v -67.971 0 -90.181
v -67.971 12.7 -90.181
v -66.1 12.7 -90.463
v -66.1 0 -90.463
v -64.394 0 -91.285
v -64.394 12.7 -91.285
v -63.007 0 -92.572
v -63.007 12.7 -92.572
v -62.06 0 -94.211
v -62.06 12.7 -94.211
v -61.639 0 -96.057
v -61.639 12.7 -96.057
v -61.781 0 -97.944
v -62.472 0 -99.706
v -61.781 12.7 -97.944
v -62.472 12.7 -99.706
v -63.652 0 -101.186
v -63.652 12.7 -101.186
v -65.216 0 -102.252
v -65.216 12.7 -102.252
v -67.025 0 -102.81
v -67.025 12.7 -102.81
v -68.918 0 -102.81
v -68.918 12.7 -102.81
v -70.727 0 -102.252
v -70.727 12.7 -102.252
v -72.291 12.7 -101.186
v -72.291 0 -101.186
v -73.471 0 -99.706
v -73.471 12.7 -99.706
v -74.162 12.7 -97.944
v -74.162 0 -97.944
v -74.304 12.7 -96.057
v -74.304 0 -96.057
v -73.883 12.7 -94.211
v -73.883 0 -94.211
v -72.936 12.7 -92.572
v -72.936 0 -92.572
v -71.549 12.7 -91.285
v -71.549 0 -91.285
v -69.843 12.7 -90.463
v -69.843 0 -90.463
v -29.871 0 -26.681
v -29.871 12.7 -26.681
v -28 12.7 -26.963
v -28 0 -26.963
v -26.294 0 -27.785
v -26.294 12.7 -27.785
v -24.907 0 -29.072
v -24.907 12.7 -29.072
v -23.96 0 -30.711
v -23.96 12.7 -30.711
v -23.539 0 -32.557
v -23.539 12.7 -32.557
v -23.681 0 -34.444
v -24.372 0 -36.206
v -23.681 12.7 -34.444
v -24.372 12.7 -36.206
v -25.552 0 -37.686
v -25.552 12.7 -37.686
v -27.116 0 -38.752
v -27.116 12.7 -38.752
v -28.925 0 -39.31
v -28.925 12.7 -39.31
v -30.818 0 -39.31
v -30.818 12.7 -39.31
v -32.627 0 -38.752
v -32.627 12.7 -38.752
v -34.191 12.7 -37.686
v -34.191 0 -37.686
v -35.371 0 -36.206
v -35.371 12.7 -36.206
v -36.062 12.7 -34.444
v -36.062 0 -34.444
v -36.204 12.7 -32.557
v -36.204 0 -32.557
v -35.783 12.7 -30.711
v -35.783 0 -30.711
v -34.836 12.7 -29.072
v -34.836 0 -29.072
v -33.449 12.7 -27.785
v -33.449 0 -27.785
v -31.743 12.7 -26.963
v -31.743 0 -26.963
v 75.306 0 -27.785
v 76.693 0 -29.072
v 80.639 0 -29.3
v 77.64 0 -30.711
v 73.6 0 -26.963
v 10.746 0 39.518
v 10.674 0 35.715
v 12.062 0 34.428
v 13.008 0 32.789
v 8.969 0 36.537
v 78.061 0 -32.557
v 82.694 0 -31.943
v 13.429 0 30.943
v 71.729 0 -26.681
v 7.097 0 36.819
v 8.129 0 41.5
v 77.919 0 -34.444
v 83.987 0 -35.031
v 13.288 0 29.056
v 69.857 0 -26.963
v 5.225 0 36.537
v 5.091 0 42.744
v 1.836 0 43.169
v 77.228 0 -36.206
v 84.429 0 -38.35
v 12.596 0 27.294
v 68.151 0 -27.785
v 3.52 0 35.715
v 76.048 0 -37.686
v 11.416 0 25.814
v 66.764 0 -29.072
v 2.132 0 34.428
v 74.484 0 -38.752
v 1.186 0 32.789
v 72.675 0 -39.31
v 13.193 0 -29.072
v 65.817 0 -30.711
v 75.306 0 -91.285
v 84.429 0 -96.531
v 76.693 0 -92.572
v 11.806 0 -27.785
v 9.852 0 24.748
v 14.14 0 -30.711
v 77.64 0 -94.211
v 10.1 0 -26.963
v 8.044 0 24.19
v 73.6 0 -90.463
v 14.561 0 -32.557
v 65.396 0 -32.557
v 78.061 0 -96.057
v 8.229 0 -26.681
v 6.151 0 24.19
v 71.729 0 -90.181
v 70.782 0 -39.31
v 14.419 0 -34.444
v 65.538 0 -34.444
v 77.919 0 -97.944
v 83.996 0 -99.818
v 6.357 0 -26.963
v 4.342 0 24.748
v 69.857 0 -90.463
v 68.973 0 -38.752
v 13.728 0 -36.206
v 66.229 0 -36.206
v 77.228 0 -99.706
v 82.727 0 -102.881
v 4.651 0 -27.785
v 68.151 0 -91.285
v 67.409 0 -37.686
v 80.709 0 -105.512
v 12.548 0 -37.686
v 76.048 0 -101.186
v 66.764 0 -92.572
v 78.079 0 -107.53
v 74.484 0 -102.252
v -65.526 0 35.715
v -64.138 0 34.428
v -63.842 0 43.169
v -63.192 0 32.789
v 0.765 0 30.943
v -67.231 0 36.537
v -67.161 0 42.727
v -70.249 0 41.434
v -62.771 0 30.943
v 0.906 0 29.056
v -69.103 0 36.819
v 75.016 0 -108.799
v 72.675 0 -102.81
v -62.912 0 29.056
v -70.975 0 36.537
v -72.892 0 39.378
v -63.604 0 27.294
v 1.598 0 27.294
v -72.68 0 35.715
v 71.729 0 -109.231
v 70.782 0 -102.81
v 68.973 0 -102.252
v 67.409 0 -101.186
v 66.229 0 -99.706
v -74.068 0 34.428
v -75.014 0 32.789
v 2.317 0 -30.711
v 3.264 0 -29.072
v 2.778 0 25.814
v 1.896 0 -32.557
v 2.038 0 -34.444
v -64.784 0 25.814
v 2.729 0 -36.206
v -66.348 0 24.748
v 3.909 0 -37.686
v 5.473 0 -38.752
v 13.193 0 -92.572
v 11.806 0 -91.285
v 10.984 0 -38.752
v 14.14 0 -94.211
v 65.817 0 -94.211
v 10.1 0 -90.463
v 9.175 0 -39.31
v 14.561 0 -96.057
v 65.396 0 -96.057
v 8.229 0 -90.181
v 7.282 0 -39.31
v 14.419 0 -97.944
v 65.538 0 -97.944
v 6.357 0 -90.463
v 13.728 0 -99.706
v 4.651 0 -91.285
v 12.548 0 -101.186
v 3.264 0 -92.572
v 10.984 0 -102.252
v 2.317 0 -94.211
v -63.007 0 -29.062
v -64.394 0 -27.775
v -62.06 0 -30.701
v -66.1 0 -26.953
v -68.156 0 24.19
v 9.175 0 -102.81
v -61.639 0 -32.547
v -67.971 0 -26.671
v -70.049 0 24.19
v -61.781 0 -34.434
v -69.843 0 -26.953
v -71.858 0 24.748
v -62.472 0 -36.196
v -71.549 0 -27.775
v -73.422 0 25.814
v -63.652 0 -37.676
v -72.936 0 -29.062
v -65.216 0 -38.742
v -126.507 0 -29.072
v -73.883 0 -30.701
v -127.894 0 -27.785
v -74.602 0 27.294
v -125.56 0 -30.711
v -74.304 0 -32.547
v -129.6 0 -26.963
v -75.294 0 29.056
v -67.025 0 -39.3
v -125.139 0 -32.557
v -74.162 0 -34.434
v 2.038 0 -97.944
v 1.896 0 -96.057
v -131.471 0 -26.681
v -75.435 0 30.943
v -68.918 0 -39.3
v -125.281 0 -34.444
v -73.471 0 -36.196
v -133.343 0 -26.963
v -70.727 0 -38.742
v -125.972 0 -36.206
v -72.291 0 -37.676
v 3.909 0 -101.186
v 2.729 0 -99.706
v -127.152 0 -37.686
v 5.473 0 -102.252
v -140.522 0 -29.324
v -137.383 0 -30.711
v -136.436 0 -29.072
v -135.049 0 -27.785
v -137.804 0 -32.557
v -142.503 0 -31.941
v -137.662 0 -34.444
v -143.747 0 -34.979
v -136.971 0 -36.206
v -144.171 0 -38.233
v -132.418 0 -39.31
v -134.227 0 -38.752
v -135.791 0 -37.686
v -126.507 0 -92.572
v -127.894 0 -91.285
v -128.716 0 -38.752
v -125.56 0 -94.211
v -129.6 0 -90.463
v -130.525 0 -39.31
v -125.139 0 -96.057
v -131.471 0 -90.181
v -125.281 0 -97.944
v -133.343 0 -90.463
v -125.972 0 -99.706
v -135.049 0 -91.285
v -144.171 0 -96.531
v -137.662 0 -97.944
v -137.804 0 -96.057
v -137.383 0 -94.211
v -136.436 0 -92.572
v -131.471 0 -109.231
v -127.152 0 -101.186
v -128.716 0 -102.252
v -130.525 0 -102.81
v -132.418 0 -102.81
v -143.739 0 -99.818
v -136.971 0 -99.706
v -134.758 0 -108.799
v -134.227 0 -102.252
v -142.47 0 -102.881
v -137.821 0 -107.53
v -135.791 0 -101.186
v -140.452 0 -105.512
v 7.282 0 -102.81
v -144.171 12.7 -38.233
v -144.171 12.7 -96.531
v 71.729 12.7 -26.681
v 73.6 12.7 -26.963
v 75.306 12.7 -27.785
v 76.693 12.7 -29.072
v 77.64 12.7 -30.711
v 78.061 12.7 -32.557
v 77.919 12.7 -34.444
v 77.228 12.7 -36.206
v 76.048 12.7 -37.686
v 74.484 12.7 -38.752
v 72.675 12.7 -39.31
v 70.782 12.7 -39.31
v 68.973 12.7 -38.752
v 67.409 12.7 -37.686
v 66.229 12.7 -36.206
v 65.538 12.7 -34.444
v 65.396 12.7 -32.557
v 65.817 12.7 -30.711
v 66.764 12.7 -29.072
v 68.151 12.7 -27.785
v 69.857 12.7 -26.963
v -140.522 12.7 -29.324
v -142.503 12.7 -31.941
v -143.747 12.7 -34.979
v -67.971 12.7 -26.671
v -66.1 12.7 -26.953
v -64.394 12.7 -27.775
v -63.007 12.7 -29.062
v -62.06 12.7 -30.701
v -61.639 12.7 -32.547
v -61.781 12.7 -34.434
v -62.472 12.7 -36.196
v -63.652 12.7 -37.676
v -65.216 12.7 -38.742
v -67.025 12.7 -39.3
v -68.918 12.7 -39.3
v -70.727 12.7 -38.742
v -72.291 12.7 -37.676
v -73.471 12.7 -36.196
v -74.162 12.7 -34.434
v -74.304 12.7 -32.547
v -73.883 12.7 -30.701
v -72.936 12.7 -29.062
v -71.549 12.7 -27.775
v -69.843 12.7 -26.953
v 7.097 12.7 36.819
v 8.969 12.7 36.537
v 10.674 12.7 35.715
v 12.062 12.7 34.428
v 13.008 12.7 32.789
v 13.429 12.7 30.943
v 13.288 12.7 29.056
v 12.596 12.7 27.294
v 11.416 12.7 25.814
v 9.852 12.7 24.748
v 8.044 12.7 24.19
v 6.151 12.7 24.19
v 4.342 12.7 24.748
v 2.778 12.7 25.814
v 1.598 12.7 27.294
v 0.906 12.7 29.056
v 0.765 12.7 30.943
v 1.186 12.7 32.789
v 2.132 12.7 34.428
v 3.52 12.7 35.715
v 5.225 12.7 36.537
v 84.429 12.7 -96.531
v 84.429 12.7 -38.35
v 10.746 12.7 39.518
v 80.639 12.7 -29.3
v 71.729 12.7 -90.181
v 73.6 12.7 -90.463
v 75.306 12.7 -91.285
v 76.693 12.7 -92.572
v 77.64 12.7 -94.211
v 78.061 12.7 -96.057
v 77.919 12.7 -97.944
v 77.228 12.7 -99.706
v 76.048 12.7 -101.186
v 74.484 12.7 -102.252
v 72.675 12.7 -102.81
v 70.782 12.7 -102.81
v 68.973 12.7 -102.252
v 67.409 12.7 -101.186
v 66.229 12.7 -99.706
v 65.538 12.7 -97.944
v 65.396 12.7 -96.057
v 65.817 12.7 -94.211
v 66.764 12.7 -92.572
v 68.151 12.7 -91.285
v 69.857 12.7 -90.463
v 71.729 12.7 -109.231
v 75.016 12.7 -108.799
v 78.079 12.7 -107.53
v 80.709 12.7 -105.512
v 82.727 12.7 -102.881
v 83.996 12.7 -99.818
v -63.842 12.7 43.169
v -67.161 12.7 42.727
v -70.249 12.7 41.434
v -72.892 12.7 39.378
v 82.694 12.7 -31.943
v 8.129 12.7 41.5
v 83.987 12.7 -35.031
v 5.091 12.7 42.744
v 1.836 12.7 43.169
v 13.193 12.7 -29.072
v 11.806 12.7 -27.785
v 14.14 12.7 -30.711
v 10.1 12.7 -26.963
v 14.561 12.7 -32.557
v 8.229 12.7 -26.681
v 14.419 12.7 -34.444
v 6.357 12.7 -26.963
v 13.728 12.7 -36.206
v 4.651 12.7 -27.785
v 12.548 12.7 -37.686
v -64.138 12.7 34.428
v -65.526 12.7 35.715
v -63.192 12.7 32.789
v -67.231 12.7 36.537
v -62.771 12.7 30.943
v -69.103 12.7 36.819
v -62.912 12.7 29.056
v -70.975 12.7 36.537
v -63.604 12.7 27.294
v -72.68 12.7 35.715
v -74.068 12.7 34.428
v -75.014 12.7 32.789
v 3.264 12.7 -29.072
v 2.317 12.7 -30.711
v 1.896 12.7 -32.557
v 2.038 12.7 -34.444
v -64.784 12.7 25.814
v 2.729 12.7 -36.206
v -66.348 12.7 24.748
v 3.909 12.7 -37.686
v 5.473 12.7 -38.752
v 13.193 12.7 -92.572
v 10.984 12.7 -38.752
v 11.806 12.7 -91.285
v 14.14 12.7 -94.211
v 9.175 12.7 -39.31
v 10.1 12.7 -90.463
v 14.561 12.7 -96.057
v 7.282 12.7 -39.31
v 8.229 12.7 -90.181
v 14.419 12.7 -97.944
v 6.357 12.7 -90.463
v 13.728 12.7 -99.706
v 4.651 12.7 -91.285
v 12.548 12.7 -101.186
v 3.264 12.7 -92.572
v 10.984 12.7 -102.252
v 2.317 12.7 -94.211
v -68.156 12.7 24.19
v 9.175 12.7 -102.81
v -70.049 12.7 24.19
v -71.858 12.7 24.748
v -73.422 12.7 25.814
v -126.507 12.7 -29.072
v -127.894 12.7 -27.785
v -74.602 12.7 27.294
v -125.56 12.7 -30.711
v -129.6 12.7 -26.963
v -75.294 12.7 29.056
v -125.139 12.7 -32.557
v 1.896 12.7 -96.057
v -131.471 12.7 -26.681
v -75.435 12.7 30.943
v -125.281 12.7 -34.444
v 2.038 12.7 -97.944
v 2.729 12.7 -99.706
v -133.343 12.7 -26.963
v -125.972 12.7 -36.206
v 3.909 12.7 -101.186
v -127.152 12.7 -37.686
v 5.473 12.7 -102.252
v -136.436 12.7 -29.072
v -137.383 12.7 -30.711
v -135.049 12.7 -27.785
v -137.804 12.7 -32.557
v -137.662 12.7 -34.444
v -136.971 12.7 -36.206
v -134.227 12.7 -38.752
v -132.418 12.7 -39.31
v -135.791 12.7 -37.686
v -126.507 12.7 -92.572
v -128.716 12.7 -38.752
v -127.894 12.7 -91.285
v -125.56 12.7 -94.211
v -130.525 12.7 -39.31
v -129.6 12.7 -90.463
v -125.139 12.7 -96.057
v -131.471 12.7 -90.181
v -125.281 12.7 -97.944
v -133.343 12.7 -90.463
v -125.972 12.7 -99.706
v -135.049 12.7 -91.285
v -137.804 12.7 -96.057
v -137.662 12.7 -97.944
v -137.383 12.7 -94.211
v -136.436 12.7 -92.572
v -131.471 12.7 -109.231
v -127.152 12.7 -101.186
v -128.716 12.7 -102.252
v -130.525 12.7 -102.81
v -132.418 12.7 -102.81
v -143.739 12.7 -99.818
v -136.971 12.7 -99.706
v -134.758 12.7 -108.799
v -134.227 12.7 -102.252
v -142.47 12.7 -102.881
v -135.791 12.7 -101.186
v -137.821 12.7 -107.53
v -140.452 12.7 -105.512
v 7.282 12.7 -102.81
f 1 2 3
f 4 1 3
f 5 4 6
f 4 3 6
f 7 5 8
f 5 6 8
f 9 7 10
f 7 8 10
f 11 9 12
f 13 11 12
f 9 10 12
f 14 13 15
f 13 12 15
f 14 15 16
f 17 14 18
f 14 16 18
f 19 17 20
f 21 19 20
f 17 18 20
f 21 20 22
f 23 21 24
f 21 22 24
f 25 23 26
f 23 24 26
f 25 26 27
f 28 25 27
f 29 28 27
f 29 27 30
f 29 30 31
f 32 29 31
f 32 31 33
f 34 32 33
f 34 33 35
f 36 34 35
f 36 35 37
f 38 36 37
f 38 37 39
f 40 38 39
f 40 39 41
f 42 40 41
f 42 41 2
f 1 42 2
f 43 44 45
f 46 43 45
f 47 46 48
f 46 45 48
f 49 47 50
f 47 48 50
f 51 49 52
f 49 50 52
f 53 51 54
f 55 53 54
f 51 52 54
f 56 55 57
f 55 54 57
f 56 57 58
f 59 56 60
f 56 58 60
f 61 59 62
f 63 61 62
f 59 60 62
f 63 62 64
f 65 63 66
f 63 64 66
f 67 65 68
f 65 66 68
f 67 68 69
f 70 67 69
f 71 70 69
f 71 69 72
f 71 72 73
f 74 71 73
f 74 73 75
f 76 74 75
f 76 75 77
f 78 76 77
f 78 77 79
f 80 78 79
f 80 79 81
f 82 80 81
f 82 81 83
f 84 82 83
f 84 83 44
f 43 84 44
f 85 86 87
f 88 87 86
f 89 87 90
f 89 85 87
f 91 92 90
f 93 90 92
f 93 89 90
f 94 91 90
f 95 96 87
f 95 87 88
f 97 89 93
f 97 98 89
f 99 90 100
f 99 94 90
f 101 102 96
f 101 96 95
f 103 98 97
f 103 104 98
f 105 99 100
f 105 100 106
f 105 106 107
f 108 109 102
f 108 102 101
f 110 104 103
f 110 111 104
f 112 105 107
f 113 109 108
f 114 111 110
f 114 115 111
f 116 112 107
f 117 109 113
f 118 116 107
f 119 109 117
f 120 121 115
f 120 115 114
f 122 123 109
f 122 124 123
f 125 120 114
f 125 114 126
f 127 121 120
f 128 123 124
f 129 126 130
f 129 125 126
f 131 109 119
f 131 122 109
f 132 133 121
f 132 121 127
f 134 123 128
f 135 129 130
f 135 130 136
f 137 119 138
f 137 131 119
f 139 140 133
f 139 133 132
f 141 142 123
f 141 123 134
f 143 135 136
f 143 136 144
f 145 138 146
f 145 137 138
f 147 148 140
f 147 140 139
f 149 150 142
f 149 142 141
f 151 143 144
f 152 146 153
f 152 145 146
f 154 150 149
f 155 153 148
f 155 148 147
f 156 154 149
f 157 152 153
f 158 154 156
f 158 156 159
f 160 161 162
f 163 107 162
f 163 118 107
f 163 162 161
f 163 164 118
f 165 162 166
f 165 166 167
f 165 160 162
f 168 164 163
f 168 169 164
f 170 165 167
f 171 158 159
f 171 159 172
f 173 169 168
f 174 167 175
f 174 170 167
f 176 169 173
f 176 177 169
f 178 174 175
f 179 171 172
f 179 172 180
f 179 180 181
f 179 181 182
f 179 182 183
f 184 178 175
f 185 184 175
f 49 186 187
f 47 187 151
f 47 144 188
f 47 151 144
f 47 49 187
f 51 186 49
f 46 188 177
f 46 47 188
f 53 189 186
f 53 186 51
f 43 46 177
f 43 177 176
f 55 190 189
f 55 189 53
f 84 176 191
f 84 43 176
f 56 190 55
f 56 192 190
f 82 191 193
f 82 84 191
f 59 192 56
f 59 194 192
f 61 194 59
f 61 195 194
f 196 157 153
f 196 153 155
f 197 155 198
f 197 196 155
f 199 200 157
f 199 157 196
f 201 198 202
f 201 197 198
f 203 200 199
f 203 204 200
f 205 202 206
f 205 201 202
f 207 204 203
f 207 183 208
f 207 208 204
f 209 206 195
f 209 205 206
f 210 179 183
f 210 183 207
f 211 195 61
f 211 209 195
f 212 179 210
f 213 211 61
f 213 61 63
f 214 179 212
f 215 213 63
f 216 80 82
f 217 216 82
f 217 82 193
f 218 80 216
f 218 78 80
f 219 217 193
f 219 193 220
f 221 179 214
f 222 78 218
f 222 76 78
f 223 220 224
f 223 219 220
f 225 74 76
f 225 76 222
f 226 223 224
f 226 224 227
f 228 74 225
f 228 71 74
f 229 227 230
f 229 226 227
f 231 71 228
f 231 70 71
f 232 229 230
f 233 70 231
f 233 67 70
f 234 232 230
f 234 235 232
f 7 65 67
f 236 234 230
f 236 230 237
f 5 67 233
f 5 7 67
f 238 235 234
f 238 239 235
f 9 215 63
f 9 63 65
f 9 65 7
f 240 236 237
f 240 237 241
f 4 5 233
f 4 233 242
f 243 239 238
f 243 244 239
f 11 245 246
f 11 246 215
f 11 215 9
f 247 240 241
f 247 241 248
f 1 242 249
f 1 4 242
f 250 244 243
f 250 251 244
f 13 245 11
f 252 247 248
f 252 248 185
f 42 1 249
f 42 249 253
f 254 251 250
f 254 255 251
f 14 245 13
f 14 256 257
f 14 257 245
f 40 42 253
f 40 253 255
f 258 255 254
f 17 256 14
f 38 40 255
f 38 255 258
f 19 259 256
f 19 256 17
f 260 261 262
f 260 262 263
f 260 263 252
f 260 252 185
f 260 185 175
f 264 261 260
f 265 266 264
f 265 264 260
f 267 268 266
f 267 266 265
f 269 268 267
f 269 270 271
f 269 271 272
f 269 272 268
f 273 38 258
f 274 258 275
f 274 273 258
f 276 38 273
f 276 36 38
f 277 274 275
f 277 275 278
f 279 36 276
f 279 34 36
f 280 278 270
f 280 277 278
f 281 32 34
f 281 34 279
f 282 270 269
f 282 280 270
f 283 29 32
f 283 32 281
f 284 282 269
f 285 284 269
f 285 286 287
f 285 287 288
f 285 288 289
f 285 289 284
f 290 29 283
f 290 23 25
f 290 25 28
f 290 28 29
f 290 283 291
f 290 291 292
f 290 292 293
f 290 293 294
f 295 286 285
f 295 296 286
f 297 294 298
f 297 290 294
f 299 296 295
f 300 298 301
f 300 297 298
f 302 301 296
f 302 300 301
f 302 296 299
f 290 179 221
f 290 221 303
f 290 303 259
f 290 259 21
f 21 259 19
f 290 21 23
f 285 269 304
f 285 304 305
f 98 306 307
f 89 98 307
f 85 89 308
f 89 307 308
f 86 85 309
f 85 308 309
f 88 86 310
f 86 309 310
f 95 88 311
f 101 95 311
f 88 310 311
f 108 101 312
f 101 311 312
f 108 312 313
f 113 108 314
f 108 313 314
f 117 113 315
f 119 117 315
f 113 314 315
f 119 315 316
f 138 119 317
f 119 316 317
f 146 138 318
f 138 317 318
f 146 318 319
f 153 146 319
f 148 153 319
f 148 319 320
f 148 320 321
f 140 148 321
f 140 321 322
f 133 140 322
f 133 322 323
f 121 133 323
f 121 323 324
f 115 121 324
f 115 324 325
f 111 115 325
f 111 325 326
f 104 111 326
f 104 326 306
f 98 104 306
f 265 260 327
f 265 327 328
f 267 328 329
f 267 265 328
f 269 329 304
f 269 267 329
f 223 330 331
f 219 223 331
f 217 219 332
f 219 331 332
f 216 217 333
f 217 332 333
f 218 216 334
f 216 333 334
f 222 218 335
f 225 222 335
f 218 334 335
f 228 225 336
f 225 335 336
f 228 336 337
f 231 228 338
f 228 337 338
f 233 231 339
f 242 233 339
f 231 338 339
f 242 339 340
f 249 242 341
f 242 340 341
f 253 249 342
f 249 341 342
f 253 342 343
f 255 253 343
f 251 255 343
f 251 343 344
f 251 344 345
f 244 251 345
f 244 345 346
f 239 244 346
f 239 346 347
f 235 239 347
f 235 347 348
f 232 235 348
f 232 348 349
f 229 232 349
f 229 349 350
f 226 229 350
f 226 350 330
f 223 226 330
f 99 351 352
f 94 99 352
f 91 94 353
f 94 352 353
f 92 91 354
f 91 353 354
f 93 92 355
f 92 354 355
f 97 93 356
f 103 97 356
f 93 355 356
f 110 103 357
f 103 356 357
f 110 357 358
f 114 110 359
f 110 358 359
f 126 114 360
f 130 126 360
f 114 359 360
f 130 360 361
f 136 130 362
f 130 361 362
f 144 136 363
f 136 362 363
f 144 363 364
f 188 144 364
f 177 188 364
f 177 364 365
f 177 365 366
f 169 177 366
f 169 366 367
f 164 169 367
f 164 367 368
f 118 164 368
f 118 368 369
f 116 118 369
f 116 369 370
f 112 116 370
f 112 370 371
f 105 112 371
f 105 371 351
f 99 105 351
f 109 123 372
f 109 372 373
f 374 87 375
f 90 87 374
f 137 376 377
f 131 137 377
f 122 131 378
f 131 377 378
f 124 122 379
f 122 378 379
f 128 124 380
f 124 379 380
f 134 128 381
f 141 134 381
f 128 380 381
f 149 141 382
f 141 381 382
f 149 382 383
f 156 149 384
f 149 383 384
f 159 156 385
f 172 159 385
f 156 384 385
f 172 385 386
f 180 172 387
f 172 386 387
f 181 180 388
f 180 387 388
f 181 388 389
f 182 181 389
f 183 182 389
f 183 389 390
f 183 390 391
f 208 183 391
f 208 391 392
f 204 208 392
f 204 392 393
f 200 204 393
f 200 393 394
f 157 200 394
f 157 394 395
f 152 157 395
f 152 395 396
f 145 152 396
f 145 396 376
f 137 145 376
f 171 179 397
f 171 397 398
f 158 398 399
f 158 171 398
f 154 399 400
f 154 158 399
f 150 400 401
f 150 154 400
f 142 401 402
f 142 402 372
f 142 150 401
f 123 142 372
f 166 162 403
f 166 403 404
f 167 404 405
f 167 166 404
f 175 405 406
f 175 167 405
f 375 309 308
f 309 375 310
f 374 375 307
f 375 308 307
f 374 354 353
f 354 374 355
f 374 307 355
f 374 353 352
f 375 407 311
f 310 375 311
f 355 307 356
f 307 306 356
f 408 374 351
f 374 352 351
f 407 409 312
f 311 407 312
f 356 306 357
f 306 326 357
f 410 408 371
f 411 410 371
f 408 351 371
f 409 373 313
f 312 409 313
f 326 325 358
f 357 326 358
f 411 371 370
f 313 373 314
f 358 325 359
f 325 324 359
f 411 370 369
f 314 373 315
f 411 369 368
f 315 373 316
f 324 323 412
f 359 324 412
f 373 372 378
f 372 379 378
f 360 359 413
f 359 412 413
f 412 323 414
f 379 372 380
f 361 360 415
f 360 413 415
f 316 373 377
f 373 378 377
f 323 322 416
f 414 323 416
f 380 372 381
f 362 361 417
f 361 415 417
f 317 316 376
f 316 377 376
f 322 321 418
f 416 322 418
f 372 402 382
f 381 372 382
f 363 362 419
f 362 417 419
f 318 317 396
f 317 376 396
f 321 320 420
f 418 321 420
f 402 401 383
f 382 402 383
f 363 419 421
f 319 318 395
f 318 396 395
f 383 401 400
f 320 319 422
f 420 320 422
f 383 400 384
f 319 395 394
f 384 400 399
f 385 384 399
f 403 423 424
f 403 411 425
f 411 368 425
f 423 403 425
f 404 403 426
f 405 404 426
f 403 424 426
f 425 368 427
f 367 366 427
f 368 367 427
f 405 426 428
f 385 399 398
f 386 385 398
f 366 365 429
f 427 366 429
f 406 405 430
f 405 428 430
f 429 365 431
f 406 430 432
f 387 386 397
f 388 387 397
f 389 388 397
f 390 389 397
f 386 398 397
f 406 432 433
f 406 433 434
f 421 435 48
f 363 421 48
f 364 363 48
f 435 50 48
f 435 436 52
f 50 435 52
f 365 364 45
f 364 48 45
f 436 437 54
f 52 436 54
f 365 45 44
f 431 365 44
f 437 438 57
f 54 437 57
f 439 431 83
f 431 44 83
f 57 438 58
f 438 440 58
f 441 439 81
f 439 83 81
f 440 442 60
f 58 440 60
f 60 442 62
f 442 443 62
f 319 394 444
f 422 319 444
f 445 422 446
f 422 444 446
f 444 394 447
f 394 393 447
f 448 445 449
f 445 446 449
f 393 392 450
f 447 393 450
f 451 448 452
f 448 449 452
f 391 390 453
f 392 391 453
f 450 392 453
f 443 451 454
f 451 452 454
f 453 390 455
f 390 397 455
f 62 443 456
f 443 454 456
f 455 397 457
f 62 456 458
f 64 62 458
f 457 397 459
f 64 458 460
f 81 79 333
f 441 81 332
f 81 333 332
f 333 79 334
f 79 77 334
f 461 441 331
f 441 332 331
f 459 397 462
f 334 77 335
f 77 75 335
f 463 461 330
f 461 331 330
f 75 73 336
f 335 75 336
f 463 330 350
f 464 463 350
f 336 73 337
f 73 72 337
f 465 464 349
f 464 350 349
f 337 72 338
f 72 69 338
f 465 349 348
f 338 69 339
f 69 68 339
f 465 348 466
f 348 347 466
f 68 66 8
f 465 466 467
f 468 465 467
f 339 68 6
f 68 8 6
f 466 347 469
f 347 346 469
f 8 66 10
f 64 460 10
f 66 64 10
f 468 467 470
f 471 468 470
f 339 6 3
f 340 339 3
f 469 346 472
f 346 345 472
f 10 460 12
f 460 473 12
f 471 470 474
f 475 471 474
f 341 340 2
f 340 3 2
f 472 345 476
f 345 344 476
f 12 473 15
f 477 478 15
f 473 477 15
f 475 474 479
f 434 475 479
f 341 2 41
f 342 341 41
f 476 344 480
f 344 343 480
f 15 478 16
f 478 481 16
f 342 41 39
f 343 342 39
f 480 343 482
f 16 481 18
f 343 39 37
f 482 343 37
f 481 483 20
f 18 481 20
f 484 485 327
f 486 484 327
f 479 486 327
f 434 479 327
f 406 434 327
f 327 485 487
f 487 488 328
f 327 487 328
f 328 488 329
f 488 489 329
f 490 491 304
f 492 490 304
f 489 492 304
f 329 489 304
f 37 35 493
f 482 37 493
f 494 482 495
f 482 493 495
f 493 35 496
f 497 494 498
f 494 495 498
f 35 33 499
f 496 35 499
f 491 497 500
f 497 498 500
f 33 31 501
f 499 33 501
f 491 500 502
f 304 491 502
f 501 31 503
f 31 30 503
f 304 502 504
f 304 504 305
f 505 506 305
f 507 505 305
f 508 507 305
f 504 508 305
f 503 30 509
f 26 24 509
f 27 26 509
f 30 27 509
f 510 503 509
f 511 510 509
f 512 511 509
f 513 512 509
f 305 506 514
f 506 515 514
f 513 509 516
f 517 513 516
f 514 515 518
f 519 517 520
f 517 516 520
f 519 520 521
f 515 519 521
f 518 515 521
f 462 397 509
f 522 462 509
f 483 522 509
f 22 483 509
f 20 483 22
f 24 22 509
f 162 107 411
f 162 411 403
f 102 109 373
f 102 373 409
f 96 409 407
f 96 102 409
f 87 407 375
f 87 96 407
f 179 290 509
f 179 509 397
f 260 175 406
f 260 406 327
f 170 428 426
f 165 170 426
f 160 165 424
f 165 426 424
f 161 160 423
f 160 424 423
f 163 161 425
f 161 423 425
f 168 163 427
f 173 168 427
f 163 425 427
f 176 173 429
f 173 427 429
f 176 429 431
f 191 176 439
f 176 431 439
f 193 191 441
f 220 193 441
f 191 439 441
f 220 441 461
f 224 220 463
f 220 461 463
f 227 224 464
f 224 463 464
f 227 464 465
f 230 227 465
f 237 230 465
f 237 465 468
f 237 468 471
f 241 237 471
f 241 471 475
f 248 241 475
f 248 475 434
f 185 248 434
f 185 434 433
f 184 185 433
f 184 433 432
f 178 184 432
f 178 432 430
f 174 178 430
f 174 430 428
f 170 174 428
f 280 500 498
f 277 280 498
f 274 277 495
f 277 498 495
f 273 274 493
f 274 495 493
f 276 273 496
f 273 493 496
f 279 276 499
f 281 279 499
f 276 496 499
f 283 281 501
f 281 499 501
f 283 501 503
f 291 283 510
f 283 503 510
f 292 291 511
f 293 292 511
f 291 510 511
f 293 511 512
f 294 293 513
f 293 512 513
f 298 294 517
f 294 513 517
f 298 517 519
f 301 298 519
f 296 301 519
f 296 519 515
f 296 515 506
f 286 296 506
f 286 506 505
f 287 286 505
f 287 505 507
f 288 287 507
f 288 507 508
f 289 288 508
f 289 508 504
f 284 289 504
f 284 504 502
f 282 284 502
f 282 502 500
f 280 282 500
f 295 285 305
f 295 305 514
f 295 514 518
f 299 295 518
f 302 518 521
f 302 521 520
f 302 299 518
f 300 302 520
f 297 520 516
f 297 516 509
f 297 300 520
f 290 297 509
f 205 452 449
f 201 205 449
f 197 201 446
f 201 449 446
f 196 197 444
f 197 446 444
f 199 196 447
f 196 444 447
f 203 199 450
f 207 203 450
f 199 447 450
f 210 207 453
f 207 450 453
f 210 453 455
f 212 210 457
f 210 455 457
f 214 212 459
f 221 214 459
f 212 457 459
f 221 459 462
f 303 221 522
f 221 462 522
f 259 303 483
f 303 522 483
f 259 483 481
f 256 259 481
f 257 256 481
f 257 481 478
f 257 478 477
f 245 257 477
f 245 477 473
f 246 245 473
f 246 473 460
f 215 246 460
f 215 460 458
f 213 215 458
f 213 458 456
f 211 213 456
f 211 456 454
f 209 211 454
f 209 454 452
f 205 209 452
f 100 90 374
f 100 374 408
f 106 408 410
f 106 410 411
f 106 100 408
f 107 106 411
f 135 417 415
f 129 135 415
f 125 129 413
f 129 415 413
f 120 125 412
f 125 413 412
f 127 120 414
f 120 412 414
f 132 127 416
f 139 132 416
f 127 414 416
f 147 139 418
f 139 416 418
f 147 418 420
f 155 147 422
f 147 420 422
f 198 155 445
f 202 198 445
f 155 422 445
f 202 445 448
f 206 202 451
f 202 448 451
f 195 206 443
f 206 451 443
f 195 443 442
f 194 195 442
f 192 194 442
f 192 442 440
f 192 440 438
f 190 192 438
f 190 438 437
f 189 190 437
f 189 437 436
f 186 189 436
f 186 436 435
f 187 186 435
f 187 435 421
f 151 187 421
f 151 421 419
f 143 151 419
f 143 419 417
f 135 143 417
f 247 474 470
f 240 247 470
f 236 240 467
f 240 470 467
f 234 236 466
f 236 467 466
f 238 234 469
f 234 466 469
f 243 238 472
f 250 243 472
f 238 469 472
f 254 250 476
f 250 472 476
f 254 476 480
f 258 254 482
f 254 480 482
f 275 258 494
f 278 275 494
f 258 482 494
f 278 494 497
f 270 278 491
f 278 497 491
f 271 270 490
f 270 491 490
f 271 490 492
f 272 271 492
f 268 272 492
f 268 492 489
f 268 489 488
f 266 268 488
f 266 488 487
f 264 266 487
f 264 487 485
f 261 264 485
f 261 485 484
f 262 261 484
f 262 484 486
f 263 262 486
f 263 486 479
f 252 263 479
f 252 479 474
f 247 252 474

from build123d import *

# Parameters (mm, degrees)
BOSS_EXTRUDE1_DEPTH = 12.7
SKETCH2_R           = 6.35
CUT_EXTRUDE1_DEPTH  = 182.323455578


with BuildPart() as part:
    # Sketch1 → Boss-Extrude1 (new body)
    with BuildSketch(Plane(origin=(0, 0, 0), x_dir=(1, 0, 0), z_dir=(0, 1, 0))):
        with BuildLine():
            Line((-131.471489953, 109.23134636), (71.728510047, 109.23134636))
            ThreePointArc((71.728510047, 109.23134636), (80.708766168, 105.511602481), (84.428510047, 96.53134636))
            Line((84.428510047, 96.53134636), (84.428510047, 38.349564826))
            ThreePointArc((84.428510047, 38.349564826), (83.442873319, 33.444088994), (80.638952072, 29.300033185))
            Line((80.638952072, 29.300033185), (10.746499625, -39.518185281))
            ThreePointArc((10.746499625, -39.518185281), (6.650668081, -42.220654573), (1.836057601, -43.16865364))
            Line((1.836057601, -43.16865364), (-63.841823784, -43.16865364))
            ThreePointArc((-63.841823784, -43.16865364), (-68.748013198, -42.182718068), (-72.892440933, -39.377993078))
            Line((-72.892440933, -39.377993078), (-140.522107103, 29.324094297))
            ThreePointArc((-140.522107103, 29.324094297), (-143.22378415, 33.419539146), (-144.171489953, 38.233433734))
            Line((-144.171489953, 38.233433734), (-144.171489953, 96.53134636))
            ThreePointArc((-144.171489953, 96.53134636), (-140.451746074, 105.511602481), (-131.471489953, 109.23134636))
        make_face()
    extrude(amount=BOSS_EXTRUDE1_DEPTH)

    # Sketch2 → Cut-Extrude1 (cut, through all)
    with BuildSketch(Plane(origin=(0, 12.7, 0), x_dir=(1, 0, 0), z_dir=(0, 1, 0))):
        with Locations(Location((-69.102883091, -30.46865364, 0), (0, 0, 270))):
            Circle(SKETCH2_R)
        with Locations(Location((7.097116909, -30.46865364, 0), (0, 0, 270))):
            Circle(SKETCH2_R)
        with Locations(Location((-67.971489953, 96.53134636, 0), (0, 0, 270))):
            Circle(SKETCH2_R)
        with Locations(Location((8.228510047, 96.53134636, 0), (0, 0, 270))):
            Circle(SKETCH2_R)
        with Locations(Location((-67.971489286, 33.021266411, 0), (0, 0, 270))):
            Circle(SKETCH2_R)
        with Locations(Location((8.228510047, 33.03134636, 0), (0, 0, 270))):
            Circle(SKETCH2_R)
        with Locations(Location((-131.471489953, 96.53134636, 0), (0, 0, 270))):
            Circle(SKETCH2_R)
        with Locations(Location((-131.471489953, 33.03134636, 0), (0, 0, 270))):
            Circle(SKETCH2_R)
        with Locations(Location((71.728510047, 96.53134636, 0), (0, 0, 270))):
            Circle(SKETCH2_R)
        with Locations(Location((71.728510047, 33.03134636, 0), (0, 0, 270))):
            Circle(SKETCH2_R)
        with Locations(Location((-29.871490619, 33.03134636, 0), (0, 0, 270))):
            Circle(SKETCH2_R)
    extrude(amount=-CUT_EXTRUDE1_DEPTH, mode=Mode.SUBTRACT)


solid = part.part
